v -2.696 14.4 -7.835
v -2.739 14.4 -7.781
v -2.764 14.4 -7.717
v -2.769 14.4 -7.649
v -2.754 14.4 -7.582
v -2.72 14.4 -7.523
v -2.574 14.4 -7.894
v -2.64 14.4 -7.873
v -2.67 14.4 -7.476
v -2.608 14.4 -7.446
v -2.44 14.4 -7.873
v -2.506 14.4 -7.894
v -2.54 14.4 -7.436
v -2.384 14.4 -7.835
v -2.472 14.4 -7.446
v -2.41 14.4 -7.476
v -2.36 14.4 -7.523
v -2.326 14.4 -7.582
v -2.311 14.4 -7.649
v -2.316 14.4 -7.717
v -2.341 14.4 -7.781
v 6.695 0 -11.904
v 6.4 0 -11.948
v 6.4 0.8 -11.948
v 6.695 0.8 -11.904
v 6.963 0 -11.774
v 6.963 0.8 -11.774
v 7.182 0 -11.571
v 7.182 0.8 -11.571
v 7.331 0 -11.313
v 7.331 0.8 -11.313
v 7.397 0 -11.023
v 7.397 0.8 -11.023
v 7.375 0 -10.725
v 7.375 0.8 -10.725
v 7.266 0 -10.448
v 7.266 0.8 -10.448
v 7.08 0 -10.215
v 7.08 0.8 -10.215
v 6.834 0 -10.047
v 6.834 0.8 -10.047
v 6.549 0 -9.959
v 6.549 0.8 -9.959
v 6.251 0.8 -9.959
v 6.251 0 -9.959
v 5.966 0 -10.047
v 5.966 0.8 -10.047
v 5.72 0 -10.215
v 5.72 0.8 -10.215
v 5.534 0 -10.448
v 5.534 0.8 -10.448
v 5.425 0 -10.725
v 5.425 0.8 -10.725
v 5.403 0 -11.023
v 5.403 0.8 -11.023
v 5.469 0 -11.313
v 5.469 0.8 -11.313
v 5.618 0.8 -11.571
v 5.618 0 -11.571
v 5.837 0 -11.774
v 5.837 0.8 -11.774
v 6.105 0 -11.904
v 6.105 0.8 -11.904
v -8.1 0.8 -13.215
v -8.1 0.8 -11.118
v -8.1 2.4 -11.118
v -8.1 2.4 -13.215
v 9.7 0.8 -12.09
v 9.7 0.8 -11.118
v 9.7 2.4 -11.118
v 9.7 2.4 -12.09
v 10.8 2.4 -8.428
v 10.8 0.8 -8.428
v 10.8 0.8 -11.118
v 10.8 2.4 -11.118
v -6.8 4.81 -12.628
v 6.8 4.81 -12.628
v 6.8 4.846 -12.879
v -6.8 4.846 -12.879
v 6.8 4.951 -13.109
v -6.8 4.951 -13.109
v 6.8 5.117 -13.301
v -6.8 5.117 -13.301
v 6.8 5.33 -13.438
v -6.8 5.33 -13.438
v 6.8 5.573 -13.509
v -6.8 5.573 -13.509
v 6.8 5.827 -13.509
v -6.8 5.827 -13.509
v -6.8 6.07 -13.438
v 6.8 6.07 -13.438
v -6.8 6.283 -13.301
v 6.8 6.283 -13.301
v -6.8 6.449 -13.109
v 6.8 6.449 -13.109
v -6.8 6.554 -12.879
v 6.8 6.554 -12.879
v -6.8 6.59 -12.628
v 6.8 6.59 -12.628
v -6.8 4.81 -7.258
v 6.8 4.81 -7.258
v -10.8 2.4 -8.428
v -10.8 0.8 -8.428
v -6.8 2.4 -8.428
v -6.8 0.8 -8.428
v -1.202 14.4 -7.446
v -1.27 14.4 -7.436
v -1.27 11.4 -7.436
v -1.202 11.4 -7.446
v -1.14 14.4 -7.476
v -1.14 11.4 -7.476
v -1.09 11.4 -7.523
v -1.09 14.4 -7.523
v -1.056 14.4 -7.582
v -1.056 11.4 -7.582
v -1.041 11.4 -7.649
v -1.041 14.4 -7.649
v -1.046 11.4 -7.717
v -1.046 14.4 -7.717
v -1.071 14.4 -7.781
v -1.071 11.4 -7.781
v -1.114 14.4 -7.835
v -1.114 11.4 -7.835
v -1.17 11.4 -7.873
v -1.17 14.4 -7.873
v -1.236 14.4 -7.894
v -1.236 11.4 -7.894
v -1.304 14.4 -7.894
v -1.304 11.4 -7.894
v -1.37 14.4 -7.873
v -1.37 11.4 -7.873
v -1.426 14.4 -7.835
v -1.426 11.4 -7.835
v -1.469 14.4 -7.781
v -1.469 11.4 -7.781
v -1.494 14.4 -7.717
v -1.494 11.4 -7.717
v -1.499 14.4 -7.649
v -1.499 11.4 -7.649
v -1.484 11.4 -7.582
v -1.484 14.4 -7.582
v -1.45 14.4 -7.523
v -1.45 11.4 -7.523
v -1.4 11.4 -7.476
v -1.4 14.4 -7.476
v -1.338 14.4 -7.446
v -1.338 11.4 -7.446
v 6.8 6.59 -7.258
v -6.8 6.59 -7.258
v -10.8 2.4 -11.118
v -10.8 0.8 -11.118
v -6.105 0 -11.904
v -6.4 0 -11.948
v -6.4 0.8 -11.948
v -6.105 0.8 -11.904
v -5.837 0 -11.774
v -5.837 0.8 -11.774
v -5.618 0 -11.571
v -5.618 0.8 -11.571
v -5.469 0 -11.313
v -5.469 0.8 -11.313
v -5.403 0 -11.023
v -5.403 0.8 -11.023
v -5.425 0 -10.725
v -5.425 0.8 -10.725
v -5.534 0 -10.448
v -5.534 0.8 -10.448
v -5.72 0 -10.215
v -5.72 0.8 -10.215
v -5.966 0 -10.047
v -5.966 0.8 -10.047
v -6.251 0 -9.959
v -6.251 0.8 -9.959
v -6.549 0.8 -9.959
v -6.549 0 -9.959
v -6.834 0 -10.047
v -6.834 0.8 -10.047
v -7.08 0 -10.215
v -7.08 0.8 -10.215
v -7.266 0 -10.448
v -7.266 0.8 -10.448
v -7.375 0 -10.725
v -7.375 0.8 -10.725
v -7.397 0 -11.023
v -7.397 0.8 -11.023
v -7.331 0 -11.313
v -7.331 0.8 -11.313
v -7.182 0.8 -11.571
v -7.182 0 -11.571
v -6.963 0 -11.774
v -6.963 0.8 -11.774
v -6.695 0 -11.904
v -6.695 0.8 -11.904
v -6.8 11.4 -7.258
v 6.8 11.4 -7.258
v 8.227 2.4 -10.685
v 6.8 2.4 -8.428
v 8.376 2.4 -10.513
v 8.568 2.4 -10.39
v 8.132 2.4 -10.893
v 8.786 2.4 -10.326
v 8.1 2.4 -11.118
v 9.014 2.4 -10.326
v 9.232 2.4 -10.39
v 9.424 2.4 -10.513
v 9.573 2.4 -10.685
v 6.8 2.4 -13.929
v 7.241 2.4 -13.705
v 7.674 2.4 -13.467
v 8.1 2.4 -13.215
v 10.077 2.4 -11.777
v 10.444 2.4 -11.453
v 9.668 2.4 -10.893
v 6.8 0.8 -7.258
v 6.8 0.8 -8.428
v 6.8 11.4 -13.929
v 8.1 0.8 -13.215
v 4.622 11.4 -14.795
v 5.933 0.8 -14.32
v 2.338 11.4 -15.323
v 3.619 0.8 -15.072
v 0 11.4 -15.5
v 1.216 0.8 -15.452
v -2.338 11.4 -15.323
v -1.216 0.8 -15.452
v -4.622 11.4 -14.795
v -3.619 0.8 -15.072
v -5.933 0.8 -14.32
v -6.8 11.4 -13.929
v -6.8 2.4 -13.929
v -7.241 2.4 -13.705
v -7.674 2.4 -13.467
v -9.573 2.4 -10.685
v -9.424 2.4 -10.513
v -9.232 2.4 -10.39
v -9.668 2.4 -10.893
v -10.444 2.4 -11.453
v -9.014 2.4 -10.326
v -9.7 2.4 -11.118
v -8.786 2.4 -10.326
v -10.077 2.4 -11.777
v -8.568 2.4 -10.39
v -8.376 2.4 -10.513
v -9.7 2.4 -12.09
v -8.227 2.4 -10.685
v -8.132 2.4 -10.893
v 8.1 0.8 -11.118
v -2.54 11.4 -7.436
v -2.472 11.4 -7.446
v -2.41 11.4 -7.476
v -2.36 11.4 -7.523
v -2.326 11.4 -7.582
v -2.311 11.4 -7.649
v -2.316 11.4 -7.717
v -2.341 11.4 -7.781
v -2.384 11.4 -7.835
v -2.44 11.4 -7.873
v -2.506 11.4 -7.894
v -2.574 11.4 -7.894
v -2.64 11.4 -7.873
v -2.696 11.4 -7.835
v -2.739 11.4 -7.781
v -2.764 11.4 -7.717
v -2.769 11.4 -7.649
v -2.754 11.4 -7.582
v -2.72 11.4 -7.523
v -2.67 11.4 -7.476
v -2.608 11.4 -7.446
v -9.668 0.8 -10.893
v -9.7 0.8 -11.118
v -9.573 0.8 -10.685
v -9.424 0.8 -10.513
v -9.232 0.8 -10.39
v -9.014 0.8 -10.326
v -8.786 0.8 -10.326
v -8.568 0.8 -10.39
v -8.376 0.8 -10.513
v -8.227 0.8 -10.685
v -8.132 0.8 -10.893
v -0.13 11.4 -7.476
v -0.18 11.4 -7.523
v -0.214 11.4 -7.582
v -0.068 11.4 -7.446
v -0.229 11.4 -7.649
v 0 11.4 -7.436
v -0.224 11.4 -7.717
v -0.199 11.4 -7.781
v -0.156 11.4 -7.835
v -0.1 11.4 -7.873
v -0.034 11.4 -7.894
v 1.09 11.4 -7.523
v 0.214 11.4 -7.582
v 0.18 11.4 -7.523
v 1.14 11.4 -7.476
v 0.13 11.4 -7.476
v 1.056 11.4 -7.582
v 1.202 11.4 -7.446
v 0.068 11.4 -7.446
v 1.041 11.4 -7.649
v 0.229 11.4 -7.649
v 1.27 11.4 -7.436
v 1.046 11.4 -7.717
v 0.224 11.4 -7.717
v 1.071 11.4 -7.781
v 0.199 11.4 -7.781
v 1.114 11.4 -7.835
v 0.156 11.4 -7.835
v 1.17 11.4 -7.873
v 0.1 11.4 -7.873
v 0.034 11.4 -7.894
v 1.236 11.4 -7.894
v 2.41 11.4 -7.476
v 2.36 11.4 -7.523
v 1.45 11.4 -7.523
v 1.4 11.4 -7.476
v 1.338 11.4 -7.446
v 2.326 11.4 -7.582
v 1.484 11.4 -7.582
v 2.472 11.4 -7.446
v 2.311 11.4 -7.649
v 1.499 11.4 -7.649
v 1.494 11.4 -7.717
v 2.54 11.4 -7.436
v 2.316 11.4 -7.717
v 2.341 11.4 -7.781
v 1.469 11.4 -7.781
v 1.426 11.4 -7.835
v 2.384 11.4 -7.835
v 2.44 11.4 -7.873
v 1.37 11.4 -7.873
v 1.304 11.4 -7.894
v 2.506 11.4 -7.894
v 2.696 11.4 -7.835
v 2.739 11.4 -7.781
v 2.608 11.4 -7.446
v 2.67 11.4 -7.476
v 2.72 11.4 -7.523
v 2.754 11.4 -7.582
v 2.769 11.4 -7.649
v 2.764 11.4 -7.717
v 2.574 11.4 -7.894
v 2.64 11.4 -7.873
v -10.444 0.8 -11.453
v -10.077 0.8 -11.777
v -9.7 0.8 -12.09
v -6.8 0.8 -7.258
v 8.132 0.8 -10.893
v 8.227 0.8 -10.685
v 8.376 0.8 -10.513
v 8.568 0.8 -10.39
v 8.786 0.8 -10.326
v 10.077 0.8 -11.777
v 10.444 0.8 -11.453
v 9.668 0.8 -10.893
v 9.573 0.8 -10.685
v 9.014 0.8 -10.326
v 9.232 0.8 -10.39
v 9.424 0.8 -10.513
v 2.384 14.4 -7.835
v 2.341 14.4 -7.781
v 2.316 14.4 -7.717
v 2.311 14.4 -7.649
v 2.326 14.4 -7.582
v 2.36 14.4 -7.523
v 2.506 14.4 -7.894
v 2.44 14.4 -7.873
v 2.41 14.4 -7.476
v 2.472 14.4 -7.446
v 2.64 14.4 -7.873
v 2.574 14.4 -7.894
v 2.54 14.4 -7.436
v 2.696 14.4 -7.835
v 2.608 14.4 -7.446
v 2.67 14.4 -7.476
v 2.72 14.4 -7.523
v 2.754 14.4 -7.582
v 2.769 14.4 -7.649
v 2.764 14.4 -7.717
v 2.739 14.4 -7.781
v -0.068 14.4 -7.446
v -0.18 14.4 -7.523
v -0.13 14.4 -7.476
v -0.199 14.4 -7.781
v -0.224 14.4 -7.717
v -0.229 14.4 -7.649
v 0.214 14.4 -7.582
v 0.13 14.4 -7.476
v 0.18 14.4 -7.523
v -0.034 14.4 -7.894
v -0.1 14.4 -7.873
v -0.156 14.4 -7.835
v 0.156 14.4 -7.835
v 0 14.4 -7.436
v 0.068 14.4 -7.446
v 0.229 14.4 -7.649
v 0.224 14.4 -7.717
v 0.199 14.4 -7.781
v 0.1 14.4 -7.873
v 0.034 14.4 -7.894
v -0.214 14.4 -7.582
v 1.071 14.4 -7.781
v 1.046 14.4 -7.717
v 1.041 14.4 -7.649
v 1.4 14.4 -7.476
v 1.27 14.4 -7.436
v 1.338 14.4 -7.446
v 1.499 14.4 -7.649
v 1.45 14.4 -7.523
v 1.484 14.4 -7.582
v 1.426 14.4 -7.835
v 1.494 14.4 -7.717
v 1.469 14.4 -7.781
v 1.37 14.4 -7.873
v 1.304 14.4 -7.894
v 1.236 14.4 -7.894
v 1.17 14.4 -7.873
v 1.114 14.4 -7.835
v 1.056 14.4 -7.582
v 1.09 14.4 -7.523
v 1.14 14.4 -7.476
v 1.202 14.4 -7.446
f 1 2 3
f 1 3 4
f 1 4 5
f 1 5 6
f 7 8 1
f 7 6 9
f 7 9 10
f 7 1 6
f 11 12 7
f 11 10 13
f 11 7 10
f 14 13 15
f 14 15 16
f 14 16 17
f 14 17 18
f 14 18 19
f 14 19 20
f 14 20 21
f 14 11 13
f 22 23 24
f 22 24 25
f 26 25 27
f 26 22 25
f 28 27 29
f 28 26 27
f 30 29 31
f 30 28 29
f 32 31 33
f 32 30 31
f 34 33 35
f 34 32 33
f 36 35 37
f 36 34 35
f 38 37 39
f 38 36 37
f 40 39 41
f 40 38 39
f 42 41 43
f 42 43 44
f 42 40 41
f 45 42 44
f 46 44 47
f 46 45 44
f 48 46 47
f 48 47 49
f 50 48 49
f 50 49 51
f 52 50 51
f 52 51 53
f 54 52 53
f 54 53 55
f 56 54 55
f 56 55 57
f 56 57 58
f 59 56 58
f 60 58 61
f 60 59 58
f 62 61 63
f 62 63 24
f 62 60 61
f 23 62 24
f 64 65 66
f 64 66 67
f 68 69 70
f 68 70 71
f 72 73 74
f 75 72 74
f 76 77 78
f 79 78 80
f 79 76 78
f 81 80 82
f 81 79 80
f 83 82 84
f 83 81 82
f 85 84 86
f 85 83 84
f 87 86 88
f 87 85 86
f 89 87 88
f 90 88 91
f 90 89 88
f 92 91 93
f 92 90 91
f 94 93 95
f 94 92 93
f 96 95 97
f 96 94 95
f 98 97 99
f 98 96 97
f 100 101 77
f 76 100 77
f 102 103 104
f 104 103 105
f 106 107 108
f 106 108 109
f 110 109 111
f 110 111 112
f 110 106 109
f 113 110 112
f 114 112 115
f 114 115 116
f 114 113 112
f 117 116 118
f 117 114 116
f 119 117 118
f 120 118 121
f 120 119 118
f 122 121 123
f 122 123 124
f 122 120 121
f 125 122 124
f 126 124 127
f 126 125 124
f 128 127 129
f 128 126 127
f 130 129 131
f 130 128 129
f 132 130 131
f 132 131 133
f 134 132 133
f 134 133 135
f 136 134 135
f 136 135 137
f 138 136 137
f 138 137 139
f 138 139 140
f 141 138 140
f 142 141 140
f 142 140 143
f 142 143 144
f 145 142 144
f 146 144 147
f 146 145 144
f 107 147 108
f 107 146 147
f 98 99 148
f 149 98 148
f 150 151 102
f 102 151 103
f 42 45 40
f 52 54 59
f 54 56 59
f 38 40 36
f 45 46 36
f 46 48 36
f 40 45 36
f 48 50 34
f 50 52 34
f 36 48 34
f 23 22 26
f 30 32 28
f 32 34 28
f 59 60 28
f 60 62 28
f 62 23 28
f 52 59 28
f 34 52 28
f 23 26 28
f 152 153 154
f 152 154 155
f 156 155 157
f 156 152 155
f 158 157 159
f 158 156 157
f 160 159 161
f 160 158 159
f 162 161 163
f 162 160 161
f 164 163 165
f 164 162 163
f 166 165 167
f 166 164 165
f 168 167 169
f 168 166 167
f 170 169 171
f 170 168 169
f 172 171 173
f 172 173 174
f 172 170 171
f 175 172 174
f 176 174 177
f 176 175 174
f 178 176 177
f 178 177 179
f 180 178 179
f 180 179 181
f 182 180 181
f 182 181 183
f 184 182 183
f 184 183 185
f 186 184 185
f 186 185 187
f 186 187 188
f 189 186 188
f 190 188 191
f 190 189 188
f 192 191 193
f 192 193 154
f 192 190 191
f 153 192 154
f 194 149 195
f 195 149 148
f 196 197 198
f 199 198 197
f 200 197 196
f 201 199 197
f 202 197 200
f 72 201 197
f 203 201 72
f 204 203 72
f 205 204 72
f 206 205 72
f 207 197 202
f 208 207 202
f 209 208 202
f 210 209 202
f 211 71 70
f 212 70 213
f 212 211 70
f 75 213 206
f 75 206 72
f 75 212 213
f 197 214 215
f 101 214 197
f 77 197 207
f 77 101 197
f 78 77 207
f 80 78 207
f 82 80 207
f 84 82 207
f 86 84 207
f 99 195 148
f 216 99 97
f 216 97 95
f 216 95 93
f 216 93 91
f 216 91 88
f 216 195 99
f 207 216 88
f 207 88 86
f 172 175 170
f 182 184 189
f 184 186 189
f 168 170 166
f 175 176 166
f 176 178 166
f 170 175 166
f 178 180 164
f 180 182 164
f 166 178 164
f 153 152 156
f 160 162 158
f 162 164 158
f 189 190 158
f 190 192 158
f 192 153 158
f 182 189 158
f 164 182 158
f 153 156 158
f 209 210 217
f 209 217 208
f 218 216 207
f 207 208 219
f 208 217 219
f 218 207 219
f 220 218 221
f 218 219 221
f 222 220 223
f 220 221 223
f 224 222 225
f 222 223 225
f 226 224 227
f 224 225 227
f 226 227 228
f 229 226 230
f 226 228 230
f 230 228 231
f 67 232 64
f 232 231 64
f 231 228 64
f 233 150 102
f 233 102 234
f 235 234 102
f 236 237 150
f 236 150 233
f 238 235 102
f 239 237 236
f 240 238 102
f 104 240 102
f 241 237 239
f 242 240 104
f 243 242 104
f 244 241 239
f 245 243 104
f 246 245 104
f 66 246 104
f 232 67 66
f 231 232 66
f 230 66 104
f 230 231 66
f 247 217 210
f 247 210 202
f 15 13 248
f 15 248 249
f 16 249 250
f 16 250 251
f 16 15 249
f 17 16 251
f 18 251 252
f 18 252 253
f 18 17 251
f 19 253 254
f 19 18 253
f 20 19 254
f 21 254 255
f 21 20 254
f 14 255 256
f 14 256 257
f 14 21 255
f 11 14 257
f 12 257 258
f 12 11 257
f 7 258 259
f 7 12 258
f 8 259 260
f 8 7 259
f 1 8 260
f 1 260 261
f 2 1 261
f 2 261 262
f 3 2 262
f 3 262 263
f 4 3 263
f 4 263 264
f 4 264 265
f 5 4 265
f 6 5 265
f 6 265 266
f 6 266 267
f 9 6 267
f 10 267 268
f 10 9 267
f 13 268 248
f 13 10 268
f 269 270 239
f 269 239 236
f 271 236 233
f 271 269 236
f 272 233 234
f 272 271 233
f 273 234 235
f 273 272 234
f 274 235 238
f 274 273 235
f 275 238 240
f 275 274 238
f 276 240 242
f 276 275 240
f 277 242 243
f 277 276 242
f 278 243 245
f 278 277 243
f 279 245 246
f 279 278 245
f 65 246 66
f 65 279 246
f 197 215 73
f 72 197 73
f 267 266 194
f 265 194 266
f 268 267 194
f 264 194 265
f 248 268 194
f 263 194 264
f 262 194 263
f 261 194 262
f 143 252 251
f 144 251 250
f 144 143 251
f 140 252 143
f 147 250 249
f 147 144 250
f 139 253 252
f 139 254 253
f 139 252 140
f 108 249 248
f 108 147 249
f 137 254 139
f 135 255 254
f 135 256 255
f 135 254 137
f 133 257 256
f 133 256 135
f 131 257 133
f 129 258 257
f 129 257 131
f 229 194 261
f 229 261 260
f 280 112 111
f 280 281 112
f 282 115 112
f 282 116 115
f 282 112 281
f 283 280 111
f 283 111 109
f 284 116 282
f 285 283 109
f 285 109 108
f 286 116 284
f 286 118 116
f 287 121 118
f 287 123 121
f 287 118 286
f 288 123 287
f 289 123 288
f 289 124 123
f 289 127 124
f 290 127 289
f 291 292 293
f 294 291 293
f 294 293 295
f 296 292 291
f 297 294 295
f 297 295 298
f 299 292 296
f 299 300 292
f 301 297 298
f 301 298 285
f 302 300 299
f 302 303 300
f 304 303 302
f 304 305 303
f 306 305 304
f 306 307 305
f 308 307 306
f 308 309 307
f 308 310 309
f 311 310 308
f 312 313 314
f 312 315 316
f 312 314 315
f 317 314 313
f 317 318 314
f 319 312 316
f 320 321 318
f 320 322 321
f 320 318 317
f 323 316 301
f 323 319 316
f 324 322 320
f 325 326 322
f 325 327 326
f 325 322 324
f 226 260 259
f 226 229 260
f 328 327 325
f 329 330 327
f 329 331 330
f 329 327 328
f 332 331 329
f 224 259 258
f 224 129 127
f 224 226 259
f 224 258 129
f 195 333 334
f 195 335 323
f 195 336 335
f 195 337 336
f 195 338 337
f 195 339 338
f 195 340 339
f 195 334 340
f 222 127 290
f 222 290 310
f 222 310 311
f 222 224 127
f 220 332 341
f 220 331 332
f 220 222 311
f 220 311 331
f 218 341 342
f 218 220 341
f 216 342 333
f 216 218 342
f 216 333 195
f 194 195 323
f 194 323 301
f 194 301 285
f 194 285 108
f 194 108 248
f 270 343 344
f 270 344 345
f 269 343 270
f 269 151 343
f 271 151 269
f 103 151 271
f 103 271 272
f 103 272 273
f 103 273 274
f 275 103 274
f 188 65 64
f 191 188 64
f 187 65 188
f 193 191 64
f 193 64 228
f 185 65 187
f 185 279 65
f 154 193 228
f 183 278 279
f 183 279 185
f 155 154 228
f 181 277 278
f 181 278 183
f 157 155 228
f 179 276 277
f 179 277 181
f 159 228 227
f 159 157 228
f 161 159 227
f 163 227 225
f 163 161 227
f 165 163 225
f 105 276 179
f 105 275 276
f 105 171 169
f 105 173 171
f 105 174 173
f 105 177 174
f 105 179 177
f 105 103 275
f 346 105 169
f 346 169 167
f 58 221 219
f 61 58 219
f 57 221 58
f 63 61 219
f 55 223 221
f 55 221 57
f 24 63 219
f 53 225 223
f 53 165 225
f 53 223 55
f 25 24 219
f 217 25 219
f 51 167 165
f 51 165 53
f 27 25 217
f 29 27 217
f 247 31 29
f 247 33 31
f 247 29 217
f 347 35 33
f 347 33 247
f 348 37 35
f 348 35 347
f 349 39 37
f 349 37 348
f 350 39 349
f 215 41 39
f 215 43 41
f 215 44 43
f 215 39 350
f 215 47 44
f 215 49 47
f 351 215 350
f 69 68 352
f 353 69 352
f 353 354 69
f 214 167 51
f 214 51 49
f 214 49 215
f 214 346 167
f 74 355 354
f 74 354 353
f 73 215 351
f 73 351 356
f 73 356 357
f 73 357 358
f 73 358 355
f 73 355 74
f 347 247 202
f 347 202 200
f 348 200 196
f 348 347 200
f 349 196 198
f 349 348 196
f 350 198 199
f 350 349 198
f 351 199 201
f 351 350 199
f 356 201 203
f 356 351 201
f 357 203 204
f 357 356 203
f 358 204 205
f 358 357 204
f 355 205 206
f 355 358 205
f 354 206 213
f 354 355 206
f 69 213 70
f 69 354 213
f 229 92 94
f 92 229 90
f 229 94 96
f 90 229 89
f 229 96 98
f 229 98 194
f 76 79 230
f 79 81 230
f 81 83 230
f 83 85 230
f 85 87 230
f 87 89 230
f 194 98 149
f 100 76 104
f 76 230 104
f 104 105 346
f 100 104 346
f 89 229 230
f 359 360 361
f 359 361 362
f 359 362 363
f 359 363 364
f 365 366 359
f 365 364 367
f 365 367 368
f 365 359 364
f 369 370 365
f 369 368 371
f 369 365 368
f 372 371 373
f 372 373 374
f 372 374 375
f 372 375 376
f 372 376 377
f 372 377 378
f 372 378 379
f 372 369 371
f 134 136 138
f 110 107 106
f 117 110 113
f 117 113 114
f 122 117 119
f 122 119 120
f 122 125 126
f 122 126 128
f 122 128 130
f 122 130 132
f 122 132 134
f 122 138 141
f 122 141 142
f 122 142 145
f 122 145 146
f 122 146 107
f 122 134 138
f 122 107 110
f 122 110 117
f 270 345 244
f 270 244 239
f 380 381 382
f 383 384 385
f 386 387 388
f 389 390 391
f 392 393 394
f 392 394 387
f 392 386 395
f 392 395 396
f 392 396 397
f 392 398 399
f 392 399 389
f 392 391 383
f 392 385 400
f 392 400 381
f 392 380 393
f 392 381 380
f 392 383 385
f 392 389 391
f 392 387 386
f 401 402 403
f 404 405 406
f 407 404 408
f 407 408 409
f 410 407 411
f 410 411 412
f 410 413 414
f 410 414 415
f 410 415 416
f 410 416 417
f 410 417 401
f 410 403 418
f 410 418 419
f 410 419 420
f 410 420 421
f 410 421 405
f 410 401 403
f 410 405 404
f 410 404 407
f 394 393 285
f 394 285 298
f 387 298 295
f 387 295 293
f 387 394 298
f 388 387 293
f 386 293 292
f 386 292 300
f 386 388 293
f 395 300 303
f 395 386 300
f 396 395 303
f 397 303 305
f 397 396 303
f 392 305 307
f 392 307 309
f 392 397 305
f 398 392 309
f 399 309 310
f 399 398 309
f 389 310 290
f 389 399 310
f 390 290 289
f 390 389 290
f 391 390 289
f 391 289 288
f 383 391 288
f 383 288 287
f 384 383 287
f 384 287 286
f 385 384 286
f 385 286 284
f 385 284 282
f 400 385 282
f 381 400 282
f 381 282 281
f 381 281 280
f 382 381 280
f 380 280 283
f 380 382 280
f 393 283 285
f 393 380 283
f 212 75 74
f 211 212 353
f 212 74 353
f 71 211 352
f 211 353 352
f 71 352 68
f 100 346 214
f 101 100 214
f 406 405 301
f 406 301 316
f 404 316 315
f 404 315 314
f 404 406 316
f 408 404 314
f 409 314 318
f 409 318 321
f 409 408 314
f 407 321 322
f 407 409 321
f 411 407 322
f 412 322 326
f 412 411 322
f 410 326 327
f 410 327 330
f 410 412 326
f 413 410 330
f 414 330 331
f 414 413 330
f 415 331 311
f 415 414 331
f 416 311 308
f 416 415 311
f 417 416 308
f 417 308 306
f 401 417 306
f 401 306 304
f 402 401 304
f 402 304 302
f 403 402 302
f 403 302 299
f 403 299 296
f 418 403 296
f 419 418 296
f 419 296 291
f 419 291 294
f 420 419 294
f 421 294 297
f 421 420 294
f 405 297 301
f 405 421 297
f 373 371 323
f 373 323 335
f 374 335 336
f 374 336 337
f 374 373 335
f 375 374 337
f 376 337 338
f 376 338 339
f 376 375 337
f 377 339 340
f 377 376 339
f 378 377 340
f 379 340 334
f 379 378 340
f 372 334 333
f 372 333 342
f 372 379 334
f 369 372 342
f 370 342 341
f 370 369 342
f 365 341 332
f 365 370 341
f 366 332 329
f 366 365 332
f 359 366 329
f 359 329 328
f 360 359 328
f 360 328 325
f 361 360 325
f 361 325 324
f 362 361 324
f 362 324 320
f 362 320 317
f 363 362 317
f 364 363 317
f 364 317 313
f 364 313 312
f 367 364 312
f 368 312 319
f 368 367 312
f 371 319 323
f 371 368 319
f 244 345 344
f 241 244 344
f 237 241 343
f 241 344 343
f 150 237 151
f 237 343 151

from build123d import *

# Parameters (mm, degrees)
BOSS_EXTRUDE1_DEPTH = 14.4
SKETCH2_R           = 11.81943886
SKETCH2_R_2         = 1
CUT_EXTRUDE1_DEPTH  = 0.8
SKETCH3_W           = 6.542631095
SKETCH3_H           = 5.500743834
SKETCH3_W_2         = 5.841537105
CUT_EXTRUDE2_DEPTH  = 12
CUT_EXTRUDE3_DEPTH  = 24.277671705
CUT_EXTRUDE4_DEPTH  = 28.520356102
SKETCH6_R           = 9.65525988
SKETCH6_R_2         = 0.23
CUT_EXTRUDE5_DEPTH  = 3


with BuildPart() as part:
    # Sketch1 → Boss-Extrude1 (new body)
    with BuildSketch(Plane(origin=(0, 0, 0), x_dir=(1, 0, 0), z_dir=(0, 1, 0))):
        with BuildLine():
            Line((-10.8, 11.118003418), (-10.8, 8.428003418))
            Line((-10.8, 8.428003418), (-6.8, 8.428003418))
            Line((-6.8, 8.428003418), (-6.8, 7.258003418))
            Line((-6.8, 7.258003418), (6.8, 7.258003418))
            Line((6.8, 7.258003418), (6.8, 8.428003418))
            Line((6.8, 8.428003418), (10.8, 8.428003418))
            Line((10.8, 8.428003418), (10.8, 11.118003418))
            ThreePointArc((10.8, 11.118003418), (0, 15.5), (-10.8, 11.118003418))
        make_face()
    extrude(amount=BOSS_EXTRUDE1_DEPTH)

    # Sketch2 → Cut-Extrude1 (cut)
    with BuildSketch(Plane.XZ):
        with Locations((0, -10.948003418)):
            Circle(SKETCH2_R)
        with Locations(Location((-6.4, -10.948003418, 0), (0, 0, 270))):
            Circle(SKETCH2_R_2, mode=Mode.SUBTRACT)
        with Locations(Location((6.4, -10.948003418, 0), (0, 0, 270))):
            Circle(SKETCH2_R_2, mode=Mode.SUBTRACT)
    extrude(amount=-CUT_EXTRUDE1_DEPTH, mode=Mode.SUBTRACT)

    # Sketch3 → Cut-Extrude2 (cut)
    with BuildSketch(Plane(origin=(0, 14.4, 0), x_dir=(1, 0, 0), z_dir=(0, 1, 0))):
        with Locations((-10.071315548, 11.178375335)):
            Rectangle(SKETCH3_W, SKETCH3_H)
        with Locations((9.720768553, 11.178375335)):
            Rectangle(SKETCH3_W_2, SKETCH3_H)
    extrude(amount=-CUT_EXTRUDE2_DEPTH, mode=Mode.SUBTRACT)

    # Sketch4 → Cut-Extrude3 (cut, through all)
    with BuildSketch(Plane.XZ.offset(-0.8)):
        with BuildLine():
            Line((9.7, -11.118003418), (9.7, -12.089665008))
            Line((9.7, -12.089665008), (9.7, -13.215142829))
            Line((9.7, -13.215142829), (8.1, -13.215142829))
            Line((8.1, -13.215142829), (8.1, -11.118003418))
            ThreePointArc((8.1, -11.118003418), (8.9, -10.318003418), (9.7, -11.118003418))
        make_face()
        with BuildLine():
            Line((-8.1, -11.118003418), (-8.1, -13.215142829))
            Line((-8.1, -13.215142829), (-9.7, -13.215142829))
            Line((-9.7, -13.215142829), (-9.7, -11.118003418))
            ThreePointArc((-9.7, -11.118003418), (-8.9, -10.318003418), (-8.1, -11.118003418))
        make_face()
    extrude(amount=-CUT_EXTRUDE3_DEPTH, mode=Mode.SUBTRACT)

    # Sketch5 → Cut-Extrude4 (cut, through all)
    with BuildSketch(Plane.ZY.offset(6.8)):
        with BuildLine():
            Line((-12.628003418, 6.59), (-7.258003418, 6.59))
            Line((-7.258003418, 6.59), (-7.258003418, 4.81))
            Line((-7.258003418, 4.81), (-12.628003418, 4.81))
            ThreePointArc((-12.628003418, 4.81), (-13.518003418, 5.7), (-12.628003418, 6.59))
        make_face()
    extrude(amount=-CUT_EXTRUDE4_DEPTH, mode=Mode.SUBTRACT)

    # Sketch6 → Cut-Extrude5 (cut)
    with BuildSketch(Plane(origin=(0, 14.4, 0), x_dir=(1, 0, 0), z_dir=(0, 1, 0))):
        with Locations((0, 7.666269644)):
            Circle(SKETCH6_R)
        with Locations(Location((0, 7.666269644, 0), (0, 0, 270))):
            Circle(SKETCH6_R_2, mode=Mode.SUBTRACT)
        with Locations(Location((1.27, 7.666269644, 0), (0, 0, 270))):
            Circle(SKETCH6_R_2, mode=Mode.SUBTRACT)
        with Locations(Location((2.54, 7.666269644, 0), (0, 0, 270))):
            Circle(SKETCH6_R_2, mode=Mode.SUBTRACT)
        with Locations(Location((-1.27, 7.666269644, 0), (0, 0, 270))):
            Circle(SKETCH6_R_2, mode=Mode.SUBTRACT)
        with Locations(Location((-2.54, 7.666269644, 0), (0, 0, 270))):
            Circle(SKETCH6_R_2, mode=Mode.SUBTRACT)
    extrude(amount=-CUT_EXTRUDE5_DEPTH, mode=Mode.SUBTRACT)


solid = part.part
